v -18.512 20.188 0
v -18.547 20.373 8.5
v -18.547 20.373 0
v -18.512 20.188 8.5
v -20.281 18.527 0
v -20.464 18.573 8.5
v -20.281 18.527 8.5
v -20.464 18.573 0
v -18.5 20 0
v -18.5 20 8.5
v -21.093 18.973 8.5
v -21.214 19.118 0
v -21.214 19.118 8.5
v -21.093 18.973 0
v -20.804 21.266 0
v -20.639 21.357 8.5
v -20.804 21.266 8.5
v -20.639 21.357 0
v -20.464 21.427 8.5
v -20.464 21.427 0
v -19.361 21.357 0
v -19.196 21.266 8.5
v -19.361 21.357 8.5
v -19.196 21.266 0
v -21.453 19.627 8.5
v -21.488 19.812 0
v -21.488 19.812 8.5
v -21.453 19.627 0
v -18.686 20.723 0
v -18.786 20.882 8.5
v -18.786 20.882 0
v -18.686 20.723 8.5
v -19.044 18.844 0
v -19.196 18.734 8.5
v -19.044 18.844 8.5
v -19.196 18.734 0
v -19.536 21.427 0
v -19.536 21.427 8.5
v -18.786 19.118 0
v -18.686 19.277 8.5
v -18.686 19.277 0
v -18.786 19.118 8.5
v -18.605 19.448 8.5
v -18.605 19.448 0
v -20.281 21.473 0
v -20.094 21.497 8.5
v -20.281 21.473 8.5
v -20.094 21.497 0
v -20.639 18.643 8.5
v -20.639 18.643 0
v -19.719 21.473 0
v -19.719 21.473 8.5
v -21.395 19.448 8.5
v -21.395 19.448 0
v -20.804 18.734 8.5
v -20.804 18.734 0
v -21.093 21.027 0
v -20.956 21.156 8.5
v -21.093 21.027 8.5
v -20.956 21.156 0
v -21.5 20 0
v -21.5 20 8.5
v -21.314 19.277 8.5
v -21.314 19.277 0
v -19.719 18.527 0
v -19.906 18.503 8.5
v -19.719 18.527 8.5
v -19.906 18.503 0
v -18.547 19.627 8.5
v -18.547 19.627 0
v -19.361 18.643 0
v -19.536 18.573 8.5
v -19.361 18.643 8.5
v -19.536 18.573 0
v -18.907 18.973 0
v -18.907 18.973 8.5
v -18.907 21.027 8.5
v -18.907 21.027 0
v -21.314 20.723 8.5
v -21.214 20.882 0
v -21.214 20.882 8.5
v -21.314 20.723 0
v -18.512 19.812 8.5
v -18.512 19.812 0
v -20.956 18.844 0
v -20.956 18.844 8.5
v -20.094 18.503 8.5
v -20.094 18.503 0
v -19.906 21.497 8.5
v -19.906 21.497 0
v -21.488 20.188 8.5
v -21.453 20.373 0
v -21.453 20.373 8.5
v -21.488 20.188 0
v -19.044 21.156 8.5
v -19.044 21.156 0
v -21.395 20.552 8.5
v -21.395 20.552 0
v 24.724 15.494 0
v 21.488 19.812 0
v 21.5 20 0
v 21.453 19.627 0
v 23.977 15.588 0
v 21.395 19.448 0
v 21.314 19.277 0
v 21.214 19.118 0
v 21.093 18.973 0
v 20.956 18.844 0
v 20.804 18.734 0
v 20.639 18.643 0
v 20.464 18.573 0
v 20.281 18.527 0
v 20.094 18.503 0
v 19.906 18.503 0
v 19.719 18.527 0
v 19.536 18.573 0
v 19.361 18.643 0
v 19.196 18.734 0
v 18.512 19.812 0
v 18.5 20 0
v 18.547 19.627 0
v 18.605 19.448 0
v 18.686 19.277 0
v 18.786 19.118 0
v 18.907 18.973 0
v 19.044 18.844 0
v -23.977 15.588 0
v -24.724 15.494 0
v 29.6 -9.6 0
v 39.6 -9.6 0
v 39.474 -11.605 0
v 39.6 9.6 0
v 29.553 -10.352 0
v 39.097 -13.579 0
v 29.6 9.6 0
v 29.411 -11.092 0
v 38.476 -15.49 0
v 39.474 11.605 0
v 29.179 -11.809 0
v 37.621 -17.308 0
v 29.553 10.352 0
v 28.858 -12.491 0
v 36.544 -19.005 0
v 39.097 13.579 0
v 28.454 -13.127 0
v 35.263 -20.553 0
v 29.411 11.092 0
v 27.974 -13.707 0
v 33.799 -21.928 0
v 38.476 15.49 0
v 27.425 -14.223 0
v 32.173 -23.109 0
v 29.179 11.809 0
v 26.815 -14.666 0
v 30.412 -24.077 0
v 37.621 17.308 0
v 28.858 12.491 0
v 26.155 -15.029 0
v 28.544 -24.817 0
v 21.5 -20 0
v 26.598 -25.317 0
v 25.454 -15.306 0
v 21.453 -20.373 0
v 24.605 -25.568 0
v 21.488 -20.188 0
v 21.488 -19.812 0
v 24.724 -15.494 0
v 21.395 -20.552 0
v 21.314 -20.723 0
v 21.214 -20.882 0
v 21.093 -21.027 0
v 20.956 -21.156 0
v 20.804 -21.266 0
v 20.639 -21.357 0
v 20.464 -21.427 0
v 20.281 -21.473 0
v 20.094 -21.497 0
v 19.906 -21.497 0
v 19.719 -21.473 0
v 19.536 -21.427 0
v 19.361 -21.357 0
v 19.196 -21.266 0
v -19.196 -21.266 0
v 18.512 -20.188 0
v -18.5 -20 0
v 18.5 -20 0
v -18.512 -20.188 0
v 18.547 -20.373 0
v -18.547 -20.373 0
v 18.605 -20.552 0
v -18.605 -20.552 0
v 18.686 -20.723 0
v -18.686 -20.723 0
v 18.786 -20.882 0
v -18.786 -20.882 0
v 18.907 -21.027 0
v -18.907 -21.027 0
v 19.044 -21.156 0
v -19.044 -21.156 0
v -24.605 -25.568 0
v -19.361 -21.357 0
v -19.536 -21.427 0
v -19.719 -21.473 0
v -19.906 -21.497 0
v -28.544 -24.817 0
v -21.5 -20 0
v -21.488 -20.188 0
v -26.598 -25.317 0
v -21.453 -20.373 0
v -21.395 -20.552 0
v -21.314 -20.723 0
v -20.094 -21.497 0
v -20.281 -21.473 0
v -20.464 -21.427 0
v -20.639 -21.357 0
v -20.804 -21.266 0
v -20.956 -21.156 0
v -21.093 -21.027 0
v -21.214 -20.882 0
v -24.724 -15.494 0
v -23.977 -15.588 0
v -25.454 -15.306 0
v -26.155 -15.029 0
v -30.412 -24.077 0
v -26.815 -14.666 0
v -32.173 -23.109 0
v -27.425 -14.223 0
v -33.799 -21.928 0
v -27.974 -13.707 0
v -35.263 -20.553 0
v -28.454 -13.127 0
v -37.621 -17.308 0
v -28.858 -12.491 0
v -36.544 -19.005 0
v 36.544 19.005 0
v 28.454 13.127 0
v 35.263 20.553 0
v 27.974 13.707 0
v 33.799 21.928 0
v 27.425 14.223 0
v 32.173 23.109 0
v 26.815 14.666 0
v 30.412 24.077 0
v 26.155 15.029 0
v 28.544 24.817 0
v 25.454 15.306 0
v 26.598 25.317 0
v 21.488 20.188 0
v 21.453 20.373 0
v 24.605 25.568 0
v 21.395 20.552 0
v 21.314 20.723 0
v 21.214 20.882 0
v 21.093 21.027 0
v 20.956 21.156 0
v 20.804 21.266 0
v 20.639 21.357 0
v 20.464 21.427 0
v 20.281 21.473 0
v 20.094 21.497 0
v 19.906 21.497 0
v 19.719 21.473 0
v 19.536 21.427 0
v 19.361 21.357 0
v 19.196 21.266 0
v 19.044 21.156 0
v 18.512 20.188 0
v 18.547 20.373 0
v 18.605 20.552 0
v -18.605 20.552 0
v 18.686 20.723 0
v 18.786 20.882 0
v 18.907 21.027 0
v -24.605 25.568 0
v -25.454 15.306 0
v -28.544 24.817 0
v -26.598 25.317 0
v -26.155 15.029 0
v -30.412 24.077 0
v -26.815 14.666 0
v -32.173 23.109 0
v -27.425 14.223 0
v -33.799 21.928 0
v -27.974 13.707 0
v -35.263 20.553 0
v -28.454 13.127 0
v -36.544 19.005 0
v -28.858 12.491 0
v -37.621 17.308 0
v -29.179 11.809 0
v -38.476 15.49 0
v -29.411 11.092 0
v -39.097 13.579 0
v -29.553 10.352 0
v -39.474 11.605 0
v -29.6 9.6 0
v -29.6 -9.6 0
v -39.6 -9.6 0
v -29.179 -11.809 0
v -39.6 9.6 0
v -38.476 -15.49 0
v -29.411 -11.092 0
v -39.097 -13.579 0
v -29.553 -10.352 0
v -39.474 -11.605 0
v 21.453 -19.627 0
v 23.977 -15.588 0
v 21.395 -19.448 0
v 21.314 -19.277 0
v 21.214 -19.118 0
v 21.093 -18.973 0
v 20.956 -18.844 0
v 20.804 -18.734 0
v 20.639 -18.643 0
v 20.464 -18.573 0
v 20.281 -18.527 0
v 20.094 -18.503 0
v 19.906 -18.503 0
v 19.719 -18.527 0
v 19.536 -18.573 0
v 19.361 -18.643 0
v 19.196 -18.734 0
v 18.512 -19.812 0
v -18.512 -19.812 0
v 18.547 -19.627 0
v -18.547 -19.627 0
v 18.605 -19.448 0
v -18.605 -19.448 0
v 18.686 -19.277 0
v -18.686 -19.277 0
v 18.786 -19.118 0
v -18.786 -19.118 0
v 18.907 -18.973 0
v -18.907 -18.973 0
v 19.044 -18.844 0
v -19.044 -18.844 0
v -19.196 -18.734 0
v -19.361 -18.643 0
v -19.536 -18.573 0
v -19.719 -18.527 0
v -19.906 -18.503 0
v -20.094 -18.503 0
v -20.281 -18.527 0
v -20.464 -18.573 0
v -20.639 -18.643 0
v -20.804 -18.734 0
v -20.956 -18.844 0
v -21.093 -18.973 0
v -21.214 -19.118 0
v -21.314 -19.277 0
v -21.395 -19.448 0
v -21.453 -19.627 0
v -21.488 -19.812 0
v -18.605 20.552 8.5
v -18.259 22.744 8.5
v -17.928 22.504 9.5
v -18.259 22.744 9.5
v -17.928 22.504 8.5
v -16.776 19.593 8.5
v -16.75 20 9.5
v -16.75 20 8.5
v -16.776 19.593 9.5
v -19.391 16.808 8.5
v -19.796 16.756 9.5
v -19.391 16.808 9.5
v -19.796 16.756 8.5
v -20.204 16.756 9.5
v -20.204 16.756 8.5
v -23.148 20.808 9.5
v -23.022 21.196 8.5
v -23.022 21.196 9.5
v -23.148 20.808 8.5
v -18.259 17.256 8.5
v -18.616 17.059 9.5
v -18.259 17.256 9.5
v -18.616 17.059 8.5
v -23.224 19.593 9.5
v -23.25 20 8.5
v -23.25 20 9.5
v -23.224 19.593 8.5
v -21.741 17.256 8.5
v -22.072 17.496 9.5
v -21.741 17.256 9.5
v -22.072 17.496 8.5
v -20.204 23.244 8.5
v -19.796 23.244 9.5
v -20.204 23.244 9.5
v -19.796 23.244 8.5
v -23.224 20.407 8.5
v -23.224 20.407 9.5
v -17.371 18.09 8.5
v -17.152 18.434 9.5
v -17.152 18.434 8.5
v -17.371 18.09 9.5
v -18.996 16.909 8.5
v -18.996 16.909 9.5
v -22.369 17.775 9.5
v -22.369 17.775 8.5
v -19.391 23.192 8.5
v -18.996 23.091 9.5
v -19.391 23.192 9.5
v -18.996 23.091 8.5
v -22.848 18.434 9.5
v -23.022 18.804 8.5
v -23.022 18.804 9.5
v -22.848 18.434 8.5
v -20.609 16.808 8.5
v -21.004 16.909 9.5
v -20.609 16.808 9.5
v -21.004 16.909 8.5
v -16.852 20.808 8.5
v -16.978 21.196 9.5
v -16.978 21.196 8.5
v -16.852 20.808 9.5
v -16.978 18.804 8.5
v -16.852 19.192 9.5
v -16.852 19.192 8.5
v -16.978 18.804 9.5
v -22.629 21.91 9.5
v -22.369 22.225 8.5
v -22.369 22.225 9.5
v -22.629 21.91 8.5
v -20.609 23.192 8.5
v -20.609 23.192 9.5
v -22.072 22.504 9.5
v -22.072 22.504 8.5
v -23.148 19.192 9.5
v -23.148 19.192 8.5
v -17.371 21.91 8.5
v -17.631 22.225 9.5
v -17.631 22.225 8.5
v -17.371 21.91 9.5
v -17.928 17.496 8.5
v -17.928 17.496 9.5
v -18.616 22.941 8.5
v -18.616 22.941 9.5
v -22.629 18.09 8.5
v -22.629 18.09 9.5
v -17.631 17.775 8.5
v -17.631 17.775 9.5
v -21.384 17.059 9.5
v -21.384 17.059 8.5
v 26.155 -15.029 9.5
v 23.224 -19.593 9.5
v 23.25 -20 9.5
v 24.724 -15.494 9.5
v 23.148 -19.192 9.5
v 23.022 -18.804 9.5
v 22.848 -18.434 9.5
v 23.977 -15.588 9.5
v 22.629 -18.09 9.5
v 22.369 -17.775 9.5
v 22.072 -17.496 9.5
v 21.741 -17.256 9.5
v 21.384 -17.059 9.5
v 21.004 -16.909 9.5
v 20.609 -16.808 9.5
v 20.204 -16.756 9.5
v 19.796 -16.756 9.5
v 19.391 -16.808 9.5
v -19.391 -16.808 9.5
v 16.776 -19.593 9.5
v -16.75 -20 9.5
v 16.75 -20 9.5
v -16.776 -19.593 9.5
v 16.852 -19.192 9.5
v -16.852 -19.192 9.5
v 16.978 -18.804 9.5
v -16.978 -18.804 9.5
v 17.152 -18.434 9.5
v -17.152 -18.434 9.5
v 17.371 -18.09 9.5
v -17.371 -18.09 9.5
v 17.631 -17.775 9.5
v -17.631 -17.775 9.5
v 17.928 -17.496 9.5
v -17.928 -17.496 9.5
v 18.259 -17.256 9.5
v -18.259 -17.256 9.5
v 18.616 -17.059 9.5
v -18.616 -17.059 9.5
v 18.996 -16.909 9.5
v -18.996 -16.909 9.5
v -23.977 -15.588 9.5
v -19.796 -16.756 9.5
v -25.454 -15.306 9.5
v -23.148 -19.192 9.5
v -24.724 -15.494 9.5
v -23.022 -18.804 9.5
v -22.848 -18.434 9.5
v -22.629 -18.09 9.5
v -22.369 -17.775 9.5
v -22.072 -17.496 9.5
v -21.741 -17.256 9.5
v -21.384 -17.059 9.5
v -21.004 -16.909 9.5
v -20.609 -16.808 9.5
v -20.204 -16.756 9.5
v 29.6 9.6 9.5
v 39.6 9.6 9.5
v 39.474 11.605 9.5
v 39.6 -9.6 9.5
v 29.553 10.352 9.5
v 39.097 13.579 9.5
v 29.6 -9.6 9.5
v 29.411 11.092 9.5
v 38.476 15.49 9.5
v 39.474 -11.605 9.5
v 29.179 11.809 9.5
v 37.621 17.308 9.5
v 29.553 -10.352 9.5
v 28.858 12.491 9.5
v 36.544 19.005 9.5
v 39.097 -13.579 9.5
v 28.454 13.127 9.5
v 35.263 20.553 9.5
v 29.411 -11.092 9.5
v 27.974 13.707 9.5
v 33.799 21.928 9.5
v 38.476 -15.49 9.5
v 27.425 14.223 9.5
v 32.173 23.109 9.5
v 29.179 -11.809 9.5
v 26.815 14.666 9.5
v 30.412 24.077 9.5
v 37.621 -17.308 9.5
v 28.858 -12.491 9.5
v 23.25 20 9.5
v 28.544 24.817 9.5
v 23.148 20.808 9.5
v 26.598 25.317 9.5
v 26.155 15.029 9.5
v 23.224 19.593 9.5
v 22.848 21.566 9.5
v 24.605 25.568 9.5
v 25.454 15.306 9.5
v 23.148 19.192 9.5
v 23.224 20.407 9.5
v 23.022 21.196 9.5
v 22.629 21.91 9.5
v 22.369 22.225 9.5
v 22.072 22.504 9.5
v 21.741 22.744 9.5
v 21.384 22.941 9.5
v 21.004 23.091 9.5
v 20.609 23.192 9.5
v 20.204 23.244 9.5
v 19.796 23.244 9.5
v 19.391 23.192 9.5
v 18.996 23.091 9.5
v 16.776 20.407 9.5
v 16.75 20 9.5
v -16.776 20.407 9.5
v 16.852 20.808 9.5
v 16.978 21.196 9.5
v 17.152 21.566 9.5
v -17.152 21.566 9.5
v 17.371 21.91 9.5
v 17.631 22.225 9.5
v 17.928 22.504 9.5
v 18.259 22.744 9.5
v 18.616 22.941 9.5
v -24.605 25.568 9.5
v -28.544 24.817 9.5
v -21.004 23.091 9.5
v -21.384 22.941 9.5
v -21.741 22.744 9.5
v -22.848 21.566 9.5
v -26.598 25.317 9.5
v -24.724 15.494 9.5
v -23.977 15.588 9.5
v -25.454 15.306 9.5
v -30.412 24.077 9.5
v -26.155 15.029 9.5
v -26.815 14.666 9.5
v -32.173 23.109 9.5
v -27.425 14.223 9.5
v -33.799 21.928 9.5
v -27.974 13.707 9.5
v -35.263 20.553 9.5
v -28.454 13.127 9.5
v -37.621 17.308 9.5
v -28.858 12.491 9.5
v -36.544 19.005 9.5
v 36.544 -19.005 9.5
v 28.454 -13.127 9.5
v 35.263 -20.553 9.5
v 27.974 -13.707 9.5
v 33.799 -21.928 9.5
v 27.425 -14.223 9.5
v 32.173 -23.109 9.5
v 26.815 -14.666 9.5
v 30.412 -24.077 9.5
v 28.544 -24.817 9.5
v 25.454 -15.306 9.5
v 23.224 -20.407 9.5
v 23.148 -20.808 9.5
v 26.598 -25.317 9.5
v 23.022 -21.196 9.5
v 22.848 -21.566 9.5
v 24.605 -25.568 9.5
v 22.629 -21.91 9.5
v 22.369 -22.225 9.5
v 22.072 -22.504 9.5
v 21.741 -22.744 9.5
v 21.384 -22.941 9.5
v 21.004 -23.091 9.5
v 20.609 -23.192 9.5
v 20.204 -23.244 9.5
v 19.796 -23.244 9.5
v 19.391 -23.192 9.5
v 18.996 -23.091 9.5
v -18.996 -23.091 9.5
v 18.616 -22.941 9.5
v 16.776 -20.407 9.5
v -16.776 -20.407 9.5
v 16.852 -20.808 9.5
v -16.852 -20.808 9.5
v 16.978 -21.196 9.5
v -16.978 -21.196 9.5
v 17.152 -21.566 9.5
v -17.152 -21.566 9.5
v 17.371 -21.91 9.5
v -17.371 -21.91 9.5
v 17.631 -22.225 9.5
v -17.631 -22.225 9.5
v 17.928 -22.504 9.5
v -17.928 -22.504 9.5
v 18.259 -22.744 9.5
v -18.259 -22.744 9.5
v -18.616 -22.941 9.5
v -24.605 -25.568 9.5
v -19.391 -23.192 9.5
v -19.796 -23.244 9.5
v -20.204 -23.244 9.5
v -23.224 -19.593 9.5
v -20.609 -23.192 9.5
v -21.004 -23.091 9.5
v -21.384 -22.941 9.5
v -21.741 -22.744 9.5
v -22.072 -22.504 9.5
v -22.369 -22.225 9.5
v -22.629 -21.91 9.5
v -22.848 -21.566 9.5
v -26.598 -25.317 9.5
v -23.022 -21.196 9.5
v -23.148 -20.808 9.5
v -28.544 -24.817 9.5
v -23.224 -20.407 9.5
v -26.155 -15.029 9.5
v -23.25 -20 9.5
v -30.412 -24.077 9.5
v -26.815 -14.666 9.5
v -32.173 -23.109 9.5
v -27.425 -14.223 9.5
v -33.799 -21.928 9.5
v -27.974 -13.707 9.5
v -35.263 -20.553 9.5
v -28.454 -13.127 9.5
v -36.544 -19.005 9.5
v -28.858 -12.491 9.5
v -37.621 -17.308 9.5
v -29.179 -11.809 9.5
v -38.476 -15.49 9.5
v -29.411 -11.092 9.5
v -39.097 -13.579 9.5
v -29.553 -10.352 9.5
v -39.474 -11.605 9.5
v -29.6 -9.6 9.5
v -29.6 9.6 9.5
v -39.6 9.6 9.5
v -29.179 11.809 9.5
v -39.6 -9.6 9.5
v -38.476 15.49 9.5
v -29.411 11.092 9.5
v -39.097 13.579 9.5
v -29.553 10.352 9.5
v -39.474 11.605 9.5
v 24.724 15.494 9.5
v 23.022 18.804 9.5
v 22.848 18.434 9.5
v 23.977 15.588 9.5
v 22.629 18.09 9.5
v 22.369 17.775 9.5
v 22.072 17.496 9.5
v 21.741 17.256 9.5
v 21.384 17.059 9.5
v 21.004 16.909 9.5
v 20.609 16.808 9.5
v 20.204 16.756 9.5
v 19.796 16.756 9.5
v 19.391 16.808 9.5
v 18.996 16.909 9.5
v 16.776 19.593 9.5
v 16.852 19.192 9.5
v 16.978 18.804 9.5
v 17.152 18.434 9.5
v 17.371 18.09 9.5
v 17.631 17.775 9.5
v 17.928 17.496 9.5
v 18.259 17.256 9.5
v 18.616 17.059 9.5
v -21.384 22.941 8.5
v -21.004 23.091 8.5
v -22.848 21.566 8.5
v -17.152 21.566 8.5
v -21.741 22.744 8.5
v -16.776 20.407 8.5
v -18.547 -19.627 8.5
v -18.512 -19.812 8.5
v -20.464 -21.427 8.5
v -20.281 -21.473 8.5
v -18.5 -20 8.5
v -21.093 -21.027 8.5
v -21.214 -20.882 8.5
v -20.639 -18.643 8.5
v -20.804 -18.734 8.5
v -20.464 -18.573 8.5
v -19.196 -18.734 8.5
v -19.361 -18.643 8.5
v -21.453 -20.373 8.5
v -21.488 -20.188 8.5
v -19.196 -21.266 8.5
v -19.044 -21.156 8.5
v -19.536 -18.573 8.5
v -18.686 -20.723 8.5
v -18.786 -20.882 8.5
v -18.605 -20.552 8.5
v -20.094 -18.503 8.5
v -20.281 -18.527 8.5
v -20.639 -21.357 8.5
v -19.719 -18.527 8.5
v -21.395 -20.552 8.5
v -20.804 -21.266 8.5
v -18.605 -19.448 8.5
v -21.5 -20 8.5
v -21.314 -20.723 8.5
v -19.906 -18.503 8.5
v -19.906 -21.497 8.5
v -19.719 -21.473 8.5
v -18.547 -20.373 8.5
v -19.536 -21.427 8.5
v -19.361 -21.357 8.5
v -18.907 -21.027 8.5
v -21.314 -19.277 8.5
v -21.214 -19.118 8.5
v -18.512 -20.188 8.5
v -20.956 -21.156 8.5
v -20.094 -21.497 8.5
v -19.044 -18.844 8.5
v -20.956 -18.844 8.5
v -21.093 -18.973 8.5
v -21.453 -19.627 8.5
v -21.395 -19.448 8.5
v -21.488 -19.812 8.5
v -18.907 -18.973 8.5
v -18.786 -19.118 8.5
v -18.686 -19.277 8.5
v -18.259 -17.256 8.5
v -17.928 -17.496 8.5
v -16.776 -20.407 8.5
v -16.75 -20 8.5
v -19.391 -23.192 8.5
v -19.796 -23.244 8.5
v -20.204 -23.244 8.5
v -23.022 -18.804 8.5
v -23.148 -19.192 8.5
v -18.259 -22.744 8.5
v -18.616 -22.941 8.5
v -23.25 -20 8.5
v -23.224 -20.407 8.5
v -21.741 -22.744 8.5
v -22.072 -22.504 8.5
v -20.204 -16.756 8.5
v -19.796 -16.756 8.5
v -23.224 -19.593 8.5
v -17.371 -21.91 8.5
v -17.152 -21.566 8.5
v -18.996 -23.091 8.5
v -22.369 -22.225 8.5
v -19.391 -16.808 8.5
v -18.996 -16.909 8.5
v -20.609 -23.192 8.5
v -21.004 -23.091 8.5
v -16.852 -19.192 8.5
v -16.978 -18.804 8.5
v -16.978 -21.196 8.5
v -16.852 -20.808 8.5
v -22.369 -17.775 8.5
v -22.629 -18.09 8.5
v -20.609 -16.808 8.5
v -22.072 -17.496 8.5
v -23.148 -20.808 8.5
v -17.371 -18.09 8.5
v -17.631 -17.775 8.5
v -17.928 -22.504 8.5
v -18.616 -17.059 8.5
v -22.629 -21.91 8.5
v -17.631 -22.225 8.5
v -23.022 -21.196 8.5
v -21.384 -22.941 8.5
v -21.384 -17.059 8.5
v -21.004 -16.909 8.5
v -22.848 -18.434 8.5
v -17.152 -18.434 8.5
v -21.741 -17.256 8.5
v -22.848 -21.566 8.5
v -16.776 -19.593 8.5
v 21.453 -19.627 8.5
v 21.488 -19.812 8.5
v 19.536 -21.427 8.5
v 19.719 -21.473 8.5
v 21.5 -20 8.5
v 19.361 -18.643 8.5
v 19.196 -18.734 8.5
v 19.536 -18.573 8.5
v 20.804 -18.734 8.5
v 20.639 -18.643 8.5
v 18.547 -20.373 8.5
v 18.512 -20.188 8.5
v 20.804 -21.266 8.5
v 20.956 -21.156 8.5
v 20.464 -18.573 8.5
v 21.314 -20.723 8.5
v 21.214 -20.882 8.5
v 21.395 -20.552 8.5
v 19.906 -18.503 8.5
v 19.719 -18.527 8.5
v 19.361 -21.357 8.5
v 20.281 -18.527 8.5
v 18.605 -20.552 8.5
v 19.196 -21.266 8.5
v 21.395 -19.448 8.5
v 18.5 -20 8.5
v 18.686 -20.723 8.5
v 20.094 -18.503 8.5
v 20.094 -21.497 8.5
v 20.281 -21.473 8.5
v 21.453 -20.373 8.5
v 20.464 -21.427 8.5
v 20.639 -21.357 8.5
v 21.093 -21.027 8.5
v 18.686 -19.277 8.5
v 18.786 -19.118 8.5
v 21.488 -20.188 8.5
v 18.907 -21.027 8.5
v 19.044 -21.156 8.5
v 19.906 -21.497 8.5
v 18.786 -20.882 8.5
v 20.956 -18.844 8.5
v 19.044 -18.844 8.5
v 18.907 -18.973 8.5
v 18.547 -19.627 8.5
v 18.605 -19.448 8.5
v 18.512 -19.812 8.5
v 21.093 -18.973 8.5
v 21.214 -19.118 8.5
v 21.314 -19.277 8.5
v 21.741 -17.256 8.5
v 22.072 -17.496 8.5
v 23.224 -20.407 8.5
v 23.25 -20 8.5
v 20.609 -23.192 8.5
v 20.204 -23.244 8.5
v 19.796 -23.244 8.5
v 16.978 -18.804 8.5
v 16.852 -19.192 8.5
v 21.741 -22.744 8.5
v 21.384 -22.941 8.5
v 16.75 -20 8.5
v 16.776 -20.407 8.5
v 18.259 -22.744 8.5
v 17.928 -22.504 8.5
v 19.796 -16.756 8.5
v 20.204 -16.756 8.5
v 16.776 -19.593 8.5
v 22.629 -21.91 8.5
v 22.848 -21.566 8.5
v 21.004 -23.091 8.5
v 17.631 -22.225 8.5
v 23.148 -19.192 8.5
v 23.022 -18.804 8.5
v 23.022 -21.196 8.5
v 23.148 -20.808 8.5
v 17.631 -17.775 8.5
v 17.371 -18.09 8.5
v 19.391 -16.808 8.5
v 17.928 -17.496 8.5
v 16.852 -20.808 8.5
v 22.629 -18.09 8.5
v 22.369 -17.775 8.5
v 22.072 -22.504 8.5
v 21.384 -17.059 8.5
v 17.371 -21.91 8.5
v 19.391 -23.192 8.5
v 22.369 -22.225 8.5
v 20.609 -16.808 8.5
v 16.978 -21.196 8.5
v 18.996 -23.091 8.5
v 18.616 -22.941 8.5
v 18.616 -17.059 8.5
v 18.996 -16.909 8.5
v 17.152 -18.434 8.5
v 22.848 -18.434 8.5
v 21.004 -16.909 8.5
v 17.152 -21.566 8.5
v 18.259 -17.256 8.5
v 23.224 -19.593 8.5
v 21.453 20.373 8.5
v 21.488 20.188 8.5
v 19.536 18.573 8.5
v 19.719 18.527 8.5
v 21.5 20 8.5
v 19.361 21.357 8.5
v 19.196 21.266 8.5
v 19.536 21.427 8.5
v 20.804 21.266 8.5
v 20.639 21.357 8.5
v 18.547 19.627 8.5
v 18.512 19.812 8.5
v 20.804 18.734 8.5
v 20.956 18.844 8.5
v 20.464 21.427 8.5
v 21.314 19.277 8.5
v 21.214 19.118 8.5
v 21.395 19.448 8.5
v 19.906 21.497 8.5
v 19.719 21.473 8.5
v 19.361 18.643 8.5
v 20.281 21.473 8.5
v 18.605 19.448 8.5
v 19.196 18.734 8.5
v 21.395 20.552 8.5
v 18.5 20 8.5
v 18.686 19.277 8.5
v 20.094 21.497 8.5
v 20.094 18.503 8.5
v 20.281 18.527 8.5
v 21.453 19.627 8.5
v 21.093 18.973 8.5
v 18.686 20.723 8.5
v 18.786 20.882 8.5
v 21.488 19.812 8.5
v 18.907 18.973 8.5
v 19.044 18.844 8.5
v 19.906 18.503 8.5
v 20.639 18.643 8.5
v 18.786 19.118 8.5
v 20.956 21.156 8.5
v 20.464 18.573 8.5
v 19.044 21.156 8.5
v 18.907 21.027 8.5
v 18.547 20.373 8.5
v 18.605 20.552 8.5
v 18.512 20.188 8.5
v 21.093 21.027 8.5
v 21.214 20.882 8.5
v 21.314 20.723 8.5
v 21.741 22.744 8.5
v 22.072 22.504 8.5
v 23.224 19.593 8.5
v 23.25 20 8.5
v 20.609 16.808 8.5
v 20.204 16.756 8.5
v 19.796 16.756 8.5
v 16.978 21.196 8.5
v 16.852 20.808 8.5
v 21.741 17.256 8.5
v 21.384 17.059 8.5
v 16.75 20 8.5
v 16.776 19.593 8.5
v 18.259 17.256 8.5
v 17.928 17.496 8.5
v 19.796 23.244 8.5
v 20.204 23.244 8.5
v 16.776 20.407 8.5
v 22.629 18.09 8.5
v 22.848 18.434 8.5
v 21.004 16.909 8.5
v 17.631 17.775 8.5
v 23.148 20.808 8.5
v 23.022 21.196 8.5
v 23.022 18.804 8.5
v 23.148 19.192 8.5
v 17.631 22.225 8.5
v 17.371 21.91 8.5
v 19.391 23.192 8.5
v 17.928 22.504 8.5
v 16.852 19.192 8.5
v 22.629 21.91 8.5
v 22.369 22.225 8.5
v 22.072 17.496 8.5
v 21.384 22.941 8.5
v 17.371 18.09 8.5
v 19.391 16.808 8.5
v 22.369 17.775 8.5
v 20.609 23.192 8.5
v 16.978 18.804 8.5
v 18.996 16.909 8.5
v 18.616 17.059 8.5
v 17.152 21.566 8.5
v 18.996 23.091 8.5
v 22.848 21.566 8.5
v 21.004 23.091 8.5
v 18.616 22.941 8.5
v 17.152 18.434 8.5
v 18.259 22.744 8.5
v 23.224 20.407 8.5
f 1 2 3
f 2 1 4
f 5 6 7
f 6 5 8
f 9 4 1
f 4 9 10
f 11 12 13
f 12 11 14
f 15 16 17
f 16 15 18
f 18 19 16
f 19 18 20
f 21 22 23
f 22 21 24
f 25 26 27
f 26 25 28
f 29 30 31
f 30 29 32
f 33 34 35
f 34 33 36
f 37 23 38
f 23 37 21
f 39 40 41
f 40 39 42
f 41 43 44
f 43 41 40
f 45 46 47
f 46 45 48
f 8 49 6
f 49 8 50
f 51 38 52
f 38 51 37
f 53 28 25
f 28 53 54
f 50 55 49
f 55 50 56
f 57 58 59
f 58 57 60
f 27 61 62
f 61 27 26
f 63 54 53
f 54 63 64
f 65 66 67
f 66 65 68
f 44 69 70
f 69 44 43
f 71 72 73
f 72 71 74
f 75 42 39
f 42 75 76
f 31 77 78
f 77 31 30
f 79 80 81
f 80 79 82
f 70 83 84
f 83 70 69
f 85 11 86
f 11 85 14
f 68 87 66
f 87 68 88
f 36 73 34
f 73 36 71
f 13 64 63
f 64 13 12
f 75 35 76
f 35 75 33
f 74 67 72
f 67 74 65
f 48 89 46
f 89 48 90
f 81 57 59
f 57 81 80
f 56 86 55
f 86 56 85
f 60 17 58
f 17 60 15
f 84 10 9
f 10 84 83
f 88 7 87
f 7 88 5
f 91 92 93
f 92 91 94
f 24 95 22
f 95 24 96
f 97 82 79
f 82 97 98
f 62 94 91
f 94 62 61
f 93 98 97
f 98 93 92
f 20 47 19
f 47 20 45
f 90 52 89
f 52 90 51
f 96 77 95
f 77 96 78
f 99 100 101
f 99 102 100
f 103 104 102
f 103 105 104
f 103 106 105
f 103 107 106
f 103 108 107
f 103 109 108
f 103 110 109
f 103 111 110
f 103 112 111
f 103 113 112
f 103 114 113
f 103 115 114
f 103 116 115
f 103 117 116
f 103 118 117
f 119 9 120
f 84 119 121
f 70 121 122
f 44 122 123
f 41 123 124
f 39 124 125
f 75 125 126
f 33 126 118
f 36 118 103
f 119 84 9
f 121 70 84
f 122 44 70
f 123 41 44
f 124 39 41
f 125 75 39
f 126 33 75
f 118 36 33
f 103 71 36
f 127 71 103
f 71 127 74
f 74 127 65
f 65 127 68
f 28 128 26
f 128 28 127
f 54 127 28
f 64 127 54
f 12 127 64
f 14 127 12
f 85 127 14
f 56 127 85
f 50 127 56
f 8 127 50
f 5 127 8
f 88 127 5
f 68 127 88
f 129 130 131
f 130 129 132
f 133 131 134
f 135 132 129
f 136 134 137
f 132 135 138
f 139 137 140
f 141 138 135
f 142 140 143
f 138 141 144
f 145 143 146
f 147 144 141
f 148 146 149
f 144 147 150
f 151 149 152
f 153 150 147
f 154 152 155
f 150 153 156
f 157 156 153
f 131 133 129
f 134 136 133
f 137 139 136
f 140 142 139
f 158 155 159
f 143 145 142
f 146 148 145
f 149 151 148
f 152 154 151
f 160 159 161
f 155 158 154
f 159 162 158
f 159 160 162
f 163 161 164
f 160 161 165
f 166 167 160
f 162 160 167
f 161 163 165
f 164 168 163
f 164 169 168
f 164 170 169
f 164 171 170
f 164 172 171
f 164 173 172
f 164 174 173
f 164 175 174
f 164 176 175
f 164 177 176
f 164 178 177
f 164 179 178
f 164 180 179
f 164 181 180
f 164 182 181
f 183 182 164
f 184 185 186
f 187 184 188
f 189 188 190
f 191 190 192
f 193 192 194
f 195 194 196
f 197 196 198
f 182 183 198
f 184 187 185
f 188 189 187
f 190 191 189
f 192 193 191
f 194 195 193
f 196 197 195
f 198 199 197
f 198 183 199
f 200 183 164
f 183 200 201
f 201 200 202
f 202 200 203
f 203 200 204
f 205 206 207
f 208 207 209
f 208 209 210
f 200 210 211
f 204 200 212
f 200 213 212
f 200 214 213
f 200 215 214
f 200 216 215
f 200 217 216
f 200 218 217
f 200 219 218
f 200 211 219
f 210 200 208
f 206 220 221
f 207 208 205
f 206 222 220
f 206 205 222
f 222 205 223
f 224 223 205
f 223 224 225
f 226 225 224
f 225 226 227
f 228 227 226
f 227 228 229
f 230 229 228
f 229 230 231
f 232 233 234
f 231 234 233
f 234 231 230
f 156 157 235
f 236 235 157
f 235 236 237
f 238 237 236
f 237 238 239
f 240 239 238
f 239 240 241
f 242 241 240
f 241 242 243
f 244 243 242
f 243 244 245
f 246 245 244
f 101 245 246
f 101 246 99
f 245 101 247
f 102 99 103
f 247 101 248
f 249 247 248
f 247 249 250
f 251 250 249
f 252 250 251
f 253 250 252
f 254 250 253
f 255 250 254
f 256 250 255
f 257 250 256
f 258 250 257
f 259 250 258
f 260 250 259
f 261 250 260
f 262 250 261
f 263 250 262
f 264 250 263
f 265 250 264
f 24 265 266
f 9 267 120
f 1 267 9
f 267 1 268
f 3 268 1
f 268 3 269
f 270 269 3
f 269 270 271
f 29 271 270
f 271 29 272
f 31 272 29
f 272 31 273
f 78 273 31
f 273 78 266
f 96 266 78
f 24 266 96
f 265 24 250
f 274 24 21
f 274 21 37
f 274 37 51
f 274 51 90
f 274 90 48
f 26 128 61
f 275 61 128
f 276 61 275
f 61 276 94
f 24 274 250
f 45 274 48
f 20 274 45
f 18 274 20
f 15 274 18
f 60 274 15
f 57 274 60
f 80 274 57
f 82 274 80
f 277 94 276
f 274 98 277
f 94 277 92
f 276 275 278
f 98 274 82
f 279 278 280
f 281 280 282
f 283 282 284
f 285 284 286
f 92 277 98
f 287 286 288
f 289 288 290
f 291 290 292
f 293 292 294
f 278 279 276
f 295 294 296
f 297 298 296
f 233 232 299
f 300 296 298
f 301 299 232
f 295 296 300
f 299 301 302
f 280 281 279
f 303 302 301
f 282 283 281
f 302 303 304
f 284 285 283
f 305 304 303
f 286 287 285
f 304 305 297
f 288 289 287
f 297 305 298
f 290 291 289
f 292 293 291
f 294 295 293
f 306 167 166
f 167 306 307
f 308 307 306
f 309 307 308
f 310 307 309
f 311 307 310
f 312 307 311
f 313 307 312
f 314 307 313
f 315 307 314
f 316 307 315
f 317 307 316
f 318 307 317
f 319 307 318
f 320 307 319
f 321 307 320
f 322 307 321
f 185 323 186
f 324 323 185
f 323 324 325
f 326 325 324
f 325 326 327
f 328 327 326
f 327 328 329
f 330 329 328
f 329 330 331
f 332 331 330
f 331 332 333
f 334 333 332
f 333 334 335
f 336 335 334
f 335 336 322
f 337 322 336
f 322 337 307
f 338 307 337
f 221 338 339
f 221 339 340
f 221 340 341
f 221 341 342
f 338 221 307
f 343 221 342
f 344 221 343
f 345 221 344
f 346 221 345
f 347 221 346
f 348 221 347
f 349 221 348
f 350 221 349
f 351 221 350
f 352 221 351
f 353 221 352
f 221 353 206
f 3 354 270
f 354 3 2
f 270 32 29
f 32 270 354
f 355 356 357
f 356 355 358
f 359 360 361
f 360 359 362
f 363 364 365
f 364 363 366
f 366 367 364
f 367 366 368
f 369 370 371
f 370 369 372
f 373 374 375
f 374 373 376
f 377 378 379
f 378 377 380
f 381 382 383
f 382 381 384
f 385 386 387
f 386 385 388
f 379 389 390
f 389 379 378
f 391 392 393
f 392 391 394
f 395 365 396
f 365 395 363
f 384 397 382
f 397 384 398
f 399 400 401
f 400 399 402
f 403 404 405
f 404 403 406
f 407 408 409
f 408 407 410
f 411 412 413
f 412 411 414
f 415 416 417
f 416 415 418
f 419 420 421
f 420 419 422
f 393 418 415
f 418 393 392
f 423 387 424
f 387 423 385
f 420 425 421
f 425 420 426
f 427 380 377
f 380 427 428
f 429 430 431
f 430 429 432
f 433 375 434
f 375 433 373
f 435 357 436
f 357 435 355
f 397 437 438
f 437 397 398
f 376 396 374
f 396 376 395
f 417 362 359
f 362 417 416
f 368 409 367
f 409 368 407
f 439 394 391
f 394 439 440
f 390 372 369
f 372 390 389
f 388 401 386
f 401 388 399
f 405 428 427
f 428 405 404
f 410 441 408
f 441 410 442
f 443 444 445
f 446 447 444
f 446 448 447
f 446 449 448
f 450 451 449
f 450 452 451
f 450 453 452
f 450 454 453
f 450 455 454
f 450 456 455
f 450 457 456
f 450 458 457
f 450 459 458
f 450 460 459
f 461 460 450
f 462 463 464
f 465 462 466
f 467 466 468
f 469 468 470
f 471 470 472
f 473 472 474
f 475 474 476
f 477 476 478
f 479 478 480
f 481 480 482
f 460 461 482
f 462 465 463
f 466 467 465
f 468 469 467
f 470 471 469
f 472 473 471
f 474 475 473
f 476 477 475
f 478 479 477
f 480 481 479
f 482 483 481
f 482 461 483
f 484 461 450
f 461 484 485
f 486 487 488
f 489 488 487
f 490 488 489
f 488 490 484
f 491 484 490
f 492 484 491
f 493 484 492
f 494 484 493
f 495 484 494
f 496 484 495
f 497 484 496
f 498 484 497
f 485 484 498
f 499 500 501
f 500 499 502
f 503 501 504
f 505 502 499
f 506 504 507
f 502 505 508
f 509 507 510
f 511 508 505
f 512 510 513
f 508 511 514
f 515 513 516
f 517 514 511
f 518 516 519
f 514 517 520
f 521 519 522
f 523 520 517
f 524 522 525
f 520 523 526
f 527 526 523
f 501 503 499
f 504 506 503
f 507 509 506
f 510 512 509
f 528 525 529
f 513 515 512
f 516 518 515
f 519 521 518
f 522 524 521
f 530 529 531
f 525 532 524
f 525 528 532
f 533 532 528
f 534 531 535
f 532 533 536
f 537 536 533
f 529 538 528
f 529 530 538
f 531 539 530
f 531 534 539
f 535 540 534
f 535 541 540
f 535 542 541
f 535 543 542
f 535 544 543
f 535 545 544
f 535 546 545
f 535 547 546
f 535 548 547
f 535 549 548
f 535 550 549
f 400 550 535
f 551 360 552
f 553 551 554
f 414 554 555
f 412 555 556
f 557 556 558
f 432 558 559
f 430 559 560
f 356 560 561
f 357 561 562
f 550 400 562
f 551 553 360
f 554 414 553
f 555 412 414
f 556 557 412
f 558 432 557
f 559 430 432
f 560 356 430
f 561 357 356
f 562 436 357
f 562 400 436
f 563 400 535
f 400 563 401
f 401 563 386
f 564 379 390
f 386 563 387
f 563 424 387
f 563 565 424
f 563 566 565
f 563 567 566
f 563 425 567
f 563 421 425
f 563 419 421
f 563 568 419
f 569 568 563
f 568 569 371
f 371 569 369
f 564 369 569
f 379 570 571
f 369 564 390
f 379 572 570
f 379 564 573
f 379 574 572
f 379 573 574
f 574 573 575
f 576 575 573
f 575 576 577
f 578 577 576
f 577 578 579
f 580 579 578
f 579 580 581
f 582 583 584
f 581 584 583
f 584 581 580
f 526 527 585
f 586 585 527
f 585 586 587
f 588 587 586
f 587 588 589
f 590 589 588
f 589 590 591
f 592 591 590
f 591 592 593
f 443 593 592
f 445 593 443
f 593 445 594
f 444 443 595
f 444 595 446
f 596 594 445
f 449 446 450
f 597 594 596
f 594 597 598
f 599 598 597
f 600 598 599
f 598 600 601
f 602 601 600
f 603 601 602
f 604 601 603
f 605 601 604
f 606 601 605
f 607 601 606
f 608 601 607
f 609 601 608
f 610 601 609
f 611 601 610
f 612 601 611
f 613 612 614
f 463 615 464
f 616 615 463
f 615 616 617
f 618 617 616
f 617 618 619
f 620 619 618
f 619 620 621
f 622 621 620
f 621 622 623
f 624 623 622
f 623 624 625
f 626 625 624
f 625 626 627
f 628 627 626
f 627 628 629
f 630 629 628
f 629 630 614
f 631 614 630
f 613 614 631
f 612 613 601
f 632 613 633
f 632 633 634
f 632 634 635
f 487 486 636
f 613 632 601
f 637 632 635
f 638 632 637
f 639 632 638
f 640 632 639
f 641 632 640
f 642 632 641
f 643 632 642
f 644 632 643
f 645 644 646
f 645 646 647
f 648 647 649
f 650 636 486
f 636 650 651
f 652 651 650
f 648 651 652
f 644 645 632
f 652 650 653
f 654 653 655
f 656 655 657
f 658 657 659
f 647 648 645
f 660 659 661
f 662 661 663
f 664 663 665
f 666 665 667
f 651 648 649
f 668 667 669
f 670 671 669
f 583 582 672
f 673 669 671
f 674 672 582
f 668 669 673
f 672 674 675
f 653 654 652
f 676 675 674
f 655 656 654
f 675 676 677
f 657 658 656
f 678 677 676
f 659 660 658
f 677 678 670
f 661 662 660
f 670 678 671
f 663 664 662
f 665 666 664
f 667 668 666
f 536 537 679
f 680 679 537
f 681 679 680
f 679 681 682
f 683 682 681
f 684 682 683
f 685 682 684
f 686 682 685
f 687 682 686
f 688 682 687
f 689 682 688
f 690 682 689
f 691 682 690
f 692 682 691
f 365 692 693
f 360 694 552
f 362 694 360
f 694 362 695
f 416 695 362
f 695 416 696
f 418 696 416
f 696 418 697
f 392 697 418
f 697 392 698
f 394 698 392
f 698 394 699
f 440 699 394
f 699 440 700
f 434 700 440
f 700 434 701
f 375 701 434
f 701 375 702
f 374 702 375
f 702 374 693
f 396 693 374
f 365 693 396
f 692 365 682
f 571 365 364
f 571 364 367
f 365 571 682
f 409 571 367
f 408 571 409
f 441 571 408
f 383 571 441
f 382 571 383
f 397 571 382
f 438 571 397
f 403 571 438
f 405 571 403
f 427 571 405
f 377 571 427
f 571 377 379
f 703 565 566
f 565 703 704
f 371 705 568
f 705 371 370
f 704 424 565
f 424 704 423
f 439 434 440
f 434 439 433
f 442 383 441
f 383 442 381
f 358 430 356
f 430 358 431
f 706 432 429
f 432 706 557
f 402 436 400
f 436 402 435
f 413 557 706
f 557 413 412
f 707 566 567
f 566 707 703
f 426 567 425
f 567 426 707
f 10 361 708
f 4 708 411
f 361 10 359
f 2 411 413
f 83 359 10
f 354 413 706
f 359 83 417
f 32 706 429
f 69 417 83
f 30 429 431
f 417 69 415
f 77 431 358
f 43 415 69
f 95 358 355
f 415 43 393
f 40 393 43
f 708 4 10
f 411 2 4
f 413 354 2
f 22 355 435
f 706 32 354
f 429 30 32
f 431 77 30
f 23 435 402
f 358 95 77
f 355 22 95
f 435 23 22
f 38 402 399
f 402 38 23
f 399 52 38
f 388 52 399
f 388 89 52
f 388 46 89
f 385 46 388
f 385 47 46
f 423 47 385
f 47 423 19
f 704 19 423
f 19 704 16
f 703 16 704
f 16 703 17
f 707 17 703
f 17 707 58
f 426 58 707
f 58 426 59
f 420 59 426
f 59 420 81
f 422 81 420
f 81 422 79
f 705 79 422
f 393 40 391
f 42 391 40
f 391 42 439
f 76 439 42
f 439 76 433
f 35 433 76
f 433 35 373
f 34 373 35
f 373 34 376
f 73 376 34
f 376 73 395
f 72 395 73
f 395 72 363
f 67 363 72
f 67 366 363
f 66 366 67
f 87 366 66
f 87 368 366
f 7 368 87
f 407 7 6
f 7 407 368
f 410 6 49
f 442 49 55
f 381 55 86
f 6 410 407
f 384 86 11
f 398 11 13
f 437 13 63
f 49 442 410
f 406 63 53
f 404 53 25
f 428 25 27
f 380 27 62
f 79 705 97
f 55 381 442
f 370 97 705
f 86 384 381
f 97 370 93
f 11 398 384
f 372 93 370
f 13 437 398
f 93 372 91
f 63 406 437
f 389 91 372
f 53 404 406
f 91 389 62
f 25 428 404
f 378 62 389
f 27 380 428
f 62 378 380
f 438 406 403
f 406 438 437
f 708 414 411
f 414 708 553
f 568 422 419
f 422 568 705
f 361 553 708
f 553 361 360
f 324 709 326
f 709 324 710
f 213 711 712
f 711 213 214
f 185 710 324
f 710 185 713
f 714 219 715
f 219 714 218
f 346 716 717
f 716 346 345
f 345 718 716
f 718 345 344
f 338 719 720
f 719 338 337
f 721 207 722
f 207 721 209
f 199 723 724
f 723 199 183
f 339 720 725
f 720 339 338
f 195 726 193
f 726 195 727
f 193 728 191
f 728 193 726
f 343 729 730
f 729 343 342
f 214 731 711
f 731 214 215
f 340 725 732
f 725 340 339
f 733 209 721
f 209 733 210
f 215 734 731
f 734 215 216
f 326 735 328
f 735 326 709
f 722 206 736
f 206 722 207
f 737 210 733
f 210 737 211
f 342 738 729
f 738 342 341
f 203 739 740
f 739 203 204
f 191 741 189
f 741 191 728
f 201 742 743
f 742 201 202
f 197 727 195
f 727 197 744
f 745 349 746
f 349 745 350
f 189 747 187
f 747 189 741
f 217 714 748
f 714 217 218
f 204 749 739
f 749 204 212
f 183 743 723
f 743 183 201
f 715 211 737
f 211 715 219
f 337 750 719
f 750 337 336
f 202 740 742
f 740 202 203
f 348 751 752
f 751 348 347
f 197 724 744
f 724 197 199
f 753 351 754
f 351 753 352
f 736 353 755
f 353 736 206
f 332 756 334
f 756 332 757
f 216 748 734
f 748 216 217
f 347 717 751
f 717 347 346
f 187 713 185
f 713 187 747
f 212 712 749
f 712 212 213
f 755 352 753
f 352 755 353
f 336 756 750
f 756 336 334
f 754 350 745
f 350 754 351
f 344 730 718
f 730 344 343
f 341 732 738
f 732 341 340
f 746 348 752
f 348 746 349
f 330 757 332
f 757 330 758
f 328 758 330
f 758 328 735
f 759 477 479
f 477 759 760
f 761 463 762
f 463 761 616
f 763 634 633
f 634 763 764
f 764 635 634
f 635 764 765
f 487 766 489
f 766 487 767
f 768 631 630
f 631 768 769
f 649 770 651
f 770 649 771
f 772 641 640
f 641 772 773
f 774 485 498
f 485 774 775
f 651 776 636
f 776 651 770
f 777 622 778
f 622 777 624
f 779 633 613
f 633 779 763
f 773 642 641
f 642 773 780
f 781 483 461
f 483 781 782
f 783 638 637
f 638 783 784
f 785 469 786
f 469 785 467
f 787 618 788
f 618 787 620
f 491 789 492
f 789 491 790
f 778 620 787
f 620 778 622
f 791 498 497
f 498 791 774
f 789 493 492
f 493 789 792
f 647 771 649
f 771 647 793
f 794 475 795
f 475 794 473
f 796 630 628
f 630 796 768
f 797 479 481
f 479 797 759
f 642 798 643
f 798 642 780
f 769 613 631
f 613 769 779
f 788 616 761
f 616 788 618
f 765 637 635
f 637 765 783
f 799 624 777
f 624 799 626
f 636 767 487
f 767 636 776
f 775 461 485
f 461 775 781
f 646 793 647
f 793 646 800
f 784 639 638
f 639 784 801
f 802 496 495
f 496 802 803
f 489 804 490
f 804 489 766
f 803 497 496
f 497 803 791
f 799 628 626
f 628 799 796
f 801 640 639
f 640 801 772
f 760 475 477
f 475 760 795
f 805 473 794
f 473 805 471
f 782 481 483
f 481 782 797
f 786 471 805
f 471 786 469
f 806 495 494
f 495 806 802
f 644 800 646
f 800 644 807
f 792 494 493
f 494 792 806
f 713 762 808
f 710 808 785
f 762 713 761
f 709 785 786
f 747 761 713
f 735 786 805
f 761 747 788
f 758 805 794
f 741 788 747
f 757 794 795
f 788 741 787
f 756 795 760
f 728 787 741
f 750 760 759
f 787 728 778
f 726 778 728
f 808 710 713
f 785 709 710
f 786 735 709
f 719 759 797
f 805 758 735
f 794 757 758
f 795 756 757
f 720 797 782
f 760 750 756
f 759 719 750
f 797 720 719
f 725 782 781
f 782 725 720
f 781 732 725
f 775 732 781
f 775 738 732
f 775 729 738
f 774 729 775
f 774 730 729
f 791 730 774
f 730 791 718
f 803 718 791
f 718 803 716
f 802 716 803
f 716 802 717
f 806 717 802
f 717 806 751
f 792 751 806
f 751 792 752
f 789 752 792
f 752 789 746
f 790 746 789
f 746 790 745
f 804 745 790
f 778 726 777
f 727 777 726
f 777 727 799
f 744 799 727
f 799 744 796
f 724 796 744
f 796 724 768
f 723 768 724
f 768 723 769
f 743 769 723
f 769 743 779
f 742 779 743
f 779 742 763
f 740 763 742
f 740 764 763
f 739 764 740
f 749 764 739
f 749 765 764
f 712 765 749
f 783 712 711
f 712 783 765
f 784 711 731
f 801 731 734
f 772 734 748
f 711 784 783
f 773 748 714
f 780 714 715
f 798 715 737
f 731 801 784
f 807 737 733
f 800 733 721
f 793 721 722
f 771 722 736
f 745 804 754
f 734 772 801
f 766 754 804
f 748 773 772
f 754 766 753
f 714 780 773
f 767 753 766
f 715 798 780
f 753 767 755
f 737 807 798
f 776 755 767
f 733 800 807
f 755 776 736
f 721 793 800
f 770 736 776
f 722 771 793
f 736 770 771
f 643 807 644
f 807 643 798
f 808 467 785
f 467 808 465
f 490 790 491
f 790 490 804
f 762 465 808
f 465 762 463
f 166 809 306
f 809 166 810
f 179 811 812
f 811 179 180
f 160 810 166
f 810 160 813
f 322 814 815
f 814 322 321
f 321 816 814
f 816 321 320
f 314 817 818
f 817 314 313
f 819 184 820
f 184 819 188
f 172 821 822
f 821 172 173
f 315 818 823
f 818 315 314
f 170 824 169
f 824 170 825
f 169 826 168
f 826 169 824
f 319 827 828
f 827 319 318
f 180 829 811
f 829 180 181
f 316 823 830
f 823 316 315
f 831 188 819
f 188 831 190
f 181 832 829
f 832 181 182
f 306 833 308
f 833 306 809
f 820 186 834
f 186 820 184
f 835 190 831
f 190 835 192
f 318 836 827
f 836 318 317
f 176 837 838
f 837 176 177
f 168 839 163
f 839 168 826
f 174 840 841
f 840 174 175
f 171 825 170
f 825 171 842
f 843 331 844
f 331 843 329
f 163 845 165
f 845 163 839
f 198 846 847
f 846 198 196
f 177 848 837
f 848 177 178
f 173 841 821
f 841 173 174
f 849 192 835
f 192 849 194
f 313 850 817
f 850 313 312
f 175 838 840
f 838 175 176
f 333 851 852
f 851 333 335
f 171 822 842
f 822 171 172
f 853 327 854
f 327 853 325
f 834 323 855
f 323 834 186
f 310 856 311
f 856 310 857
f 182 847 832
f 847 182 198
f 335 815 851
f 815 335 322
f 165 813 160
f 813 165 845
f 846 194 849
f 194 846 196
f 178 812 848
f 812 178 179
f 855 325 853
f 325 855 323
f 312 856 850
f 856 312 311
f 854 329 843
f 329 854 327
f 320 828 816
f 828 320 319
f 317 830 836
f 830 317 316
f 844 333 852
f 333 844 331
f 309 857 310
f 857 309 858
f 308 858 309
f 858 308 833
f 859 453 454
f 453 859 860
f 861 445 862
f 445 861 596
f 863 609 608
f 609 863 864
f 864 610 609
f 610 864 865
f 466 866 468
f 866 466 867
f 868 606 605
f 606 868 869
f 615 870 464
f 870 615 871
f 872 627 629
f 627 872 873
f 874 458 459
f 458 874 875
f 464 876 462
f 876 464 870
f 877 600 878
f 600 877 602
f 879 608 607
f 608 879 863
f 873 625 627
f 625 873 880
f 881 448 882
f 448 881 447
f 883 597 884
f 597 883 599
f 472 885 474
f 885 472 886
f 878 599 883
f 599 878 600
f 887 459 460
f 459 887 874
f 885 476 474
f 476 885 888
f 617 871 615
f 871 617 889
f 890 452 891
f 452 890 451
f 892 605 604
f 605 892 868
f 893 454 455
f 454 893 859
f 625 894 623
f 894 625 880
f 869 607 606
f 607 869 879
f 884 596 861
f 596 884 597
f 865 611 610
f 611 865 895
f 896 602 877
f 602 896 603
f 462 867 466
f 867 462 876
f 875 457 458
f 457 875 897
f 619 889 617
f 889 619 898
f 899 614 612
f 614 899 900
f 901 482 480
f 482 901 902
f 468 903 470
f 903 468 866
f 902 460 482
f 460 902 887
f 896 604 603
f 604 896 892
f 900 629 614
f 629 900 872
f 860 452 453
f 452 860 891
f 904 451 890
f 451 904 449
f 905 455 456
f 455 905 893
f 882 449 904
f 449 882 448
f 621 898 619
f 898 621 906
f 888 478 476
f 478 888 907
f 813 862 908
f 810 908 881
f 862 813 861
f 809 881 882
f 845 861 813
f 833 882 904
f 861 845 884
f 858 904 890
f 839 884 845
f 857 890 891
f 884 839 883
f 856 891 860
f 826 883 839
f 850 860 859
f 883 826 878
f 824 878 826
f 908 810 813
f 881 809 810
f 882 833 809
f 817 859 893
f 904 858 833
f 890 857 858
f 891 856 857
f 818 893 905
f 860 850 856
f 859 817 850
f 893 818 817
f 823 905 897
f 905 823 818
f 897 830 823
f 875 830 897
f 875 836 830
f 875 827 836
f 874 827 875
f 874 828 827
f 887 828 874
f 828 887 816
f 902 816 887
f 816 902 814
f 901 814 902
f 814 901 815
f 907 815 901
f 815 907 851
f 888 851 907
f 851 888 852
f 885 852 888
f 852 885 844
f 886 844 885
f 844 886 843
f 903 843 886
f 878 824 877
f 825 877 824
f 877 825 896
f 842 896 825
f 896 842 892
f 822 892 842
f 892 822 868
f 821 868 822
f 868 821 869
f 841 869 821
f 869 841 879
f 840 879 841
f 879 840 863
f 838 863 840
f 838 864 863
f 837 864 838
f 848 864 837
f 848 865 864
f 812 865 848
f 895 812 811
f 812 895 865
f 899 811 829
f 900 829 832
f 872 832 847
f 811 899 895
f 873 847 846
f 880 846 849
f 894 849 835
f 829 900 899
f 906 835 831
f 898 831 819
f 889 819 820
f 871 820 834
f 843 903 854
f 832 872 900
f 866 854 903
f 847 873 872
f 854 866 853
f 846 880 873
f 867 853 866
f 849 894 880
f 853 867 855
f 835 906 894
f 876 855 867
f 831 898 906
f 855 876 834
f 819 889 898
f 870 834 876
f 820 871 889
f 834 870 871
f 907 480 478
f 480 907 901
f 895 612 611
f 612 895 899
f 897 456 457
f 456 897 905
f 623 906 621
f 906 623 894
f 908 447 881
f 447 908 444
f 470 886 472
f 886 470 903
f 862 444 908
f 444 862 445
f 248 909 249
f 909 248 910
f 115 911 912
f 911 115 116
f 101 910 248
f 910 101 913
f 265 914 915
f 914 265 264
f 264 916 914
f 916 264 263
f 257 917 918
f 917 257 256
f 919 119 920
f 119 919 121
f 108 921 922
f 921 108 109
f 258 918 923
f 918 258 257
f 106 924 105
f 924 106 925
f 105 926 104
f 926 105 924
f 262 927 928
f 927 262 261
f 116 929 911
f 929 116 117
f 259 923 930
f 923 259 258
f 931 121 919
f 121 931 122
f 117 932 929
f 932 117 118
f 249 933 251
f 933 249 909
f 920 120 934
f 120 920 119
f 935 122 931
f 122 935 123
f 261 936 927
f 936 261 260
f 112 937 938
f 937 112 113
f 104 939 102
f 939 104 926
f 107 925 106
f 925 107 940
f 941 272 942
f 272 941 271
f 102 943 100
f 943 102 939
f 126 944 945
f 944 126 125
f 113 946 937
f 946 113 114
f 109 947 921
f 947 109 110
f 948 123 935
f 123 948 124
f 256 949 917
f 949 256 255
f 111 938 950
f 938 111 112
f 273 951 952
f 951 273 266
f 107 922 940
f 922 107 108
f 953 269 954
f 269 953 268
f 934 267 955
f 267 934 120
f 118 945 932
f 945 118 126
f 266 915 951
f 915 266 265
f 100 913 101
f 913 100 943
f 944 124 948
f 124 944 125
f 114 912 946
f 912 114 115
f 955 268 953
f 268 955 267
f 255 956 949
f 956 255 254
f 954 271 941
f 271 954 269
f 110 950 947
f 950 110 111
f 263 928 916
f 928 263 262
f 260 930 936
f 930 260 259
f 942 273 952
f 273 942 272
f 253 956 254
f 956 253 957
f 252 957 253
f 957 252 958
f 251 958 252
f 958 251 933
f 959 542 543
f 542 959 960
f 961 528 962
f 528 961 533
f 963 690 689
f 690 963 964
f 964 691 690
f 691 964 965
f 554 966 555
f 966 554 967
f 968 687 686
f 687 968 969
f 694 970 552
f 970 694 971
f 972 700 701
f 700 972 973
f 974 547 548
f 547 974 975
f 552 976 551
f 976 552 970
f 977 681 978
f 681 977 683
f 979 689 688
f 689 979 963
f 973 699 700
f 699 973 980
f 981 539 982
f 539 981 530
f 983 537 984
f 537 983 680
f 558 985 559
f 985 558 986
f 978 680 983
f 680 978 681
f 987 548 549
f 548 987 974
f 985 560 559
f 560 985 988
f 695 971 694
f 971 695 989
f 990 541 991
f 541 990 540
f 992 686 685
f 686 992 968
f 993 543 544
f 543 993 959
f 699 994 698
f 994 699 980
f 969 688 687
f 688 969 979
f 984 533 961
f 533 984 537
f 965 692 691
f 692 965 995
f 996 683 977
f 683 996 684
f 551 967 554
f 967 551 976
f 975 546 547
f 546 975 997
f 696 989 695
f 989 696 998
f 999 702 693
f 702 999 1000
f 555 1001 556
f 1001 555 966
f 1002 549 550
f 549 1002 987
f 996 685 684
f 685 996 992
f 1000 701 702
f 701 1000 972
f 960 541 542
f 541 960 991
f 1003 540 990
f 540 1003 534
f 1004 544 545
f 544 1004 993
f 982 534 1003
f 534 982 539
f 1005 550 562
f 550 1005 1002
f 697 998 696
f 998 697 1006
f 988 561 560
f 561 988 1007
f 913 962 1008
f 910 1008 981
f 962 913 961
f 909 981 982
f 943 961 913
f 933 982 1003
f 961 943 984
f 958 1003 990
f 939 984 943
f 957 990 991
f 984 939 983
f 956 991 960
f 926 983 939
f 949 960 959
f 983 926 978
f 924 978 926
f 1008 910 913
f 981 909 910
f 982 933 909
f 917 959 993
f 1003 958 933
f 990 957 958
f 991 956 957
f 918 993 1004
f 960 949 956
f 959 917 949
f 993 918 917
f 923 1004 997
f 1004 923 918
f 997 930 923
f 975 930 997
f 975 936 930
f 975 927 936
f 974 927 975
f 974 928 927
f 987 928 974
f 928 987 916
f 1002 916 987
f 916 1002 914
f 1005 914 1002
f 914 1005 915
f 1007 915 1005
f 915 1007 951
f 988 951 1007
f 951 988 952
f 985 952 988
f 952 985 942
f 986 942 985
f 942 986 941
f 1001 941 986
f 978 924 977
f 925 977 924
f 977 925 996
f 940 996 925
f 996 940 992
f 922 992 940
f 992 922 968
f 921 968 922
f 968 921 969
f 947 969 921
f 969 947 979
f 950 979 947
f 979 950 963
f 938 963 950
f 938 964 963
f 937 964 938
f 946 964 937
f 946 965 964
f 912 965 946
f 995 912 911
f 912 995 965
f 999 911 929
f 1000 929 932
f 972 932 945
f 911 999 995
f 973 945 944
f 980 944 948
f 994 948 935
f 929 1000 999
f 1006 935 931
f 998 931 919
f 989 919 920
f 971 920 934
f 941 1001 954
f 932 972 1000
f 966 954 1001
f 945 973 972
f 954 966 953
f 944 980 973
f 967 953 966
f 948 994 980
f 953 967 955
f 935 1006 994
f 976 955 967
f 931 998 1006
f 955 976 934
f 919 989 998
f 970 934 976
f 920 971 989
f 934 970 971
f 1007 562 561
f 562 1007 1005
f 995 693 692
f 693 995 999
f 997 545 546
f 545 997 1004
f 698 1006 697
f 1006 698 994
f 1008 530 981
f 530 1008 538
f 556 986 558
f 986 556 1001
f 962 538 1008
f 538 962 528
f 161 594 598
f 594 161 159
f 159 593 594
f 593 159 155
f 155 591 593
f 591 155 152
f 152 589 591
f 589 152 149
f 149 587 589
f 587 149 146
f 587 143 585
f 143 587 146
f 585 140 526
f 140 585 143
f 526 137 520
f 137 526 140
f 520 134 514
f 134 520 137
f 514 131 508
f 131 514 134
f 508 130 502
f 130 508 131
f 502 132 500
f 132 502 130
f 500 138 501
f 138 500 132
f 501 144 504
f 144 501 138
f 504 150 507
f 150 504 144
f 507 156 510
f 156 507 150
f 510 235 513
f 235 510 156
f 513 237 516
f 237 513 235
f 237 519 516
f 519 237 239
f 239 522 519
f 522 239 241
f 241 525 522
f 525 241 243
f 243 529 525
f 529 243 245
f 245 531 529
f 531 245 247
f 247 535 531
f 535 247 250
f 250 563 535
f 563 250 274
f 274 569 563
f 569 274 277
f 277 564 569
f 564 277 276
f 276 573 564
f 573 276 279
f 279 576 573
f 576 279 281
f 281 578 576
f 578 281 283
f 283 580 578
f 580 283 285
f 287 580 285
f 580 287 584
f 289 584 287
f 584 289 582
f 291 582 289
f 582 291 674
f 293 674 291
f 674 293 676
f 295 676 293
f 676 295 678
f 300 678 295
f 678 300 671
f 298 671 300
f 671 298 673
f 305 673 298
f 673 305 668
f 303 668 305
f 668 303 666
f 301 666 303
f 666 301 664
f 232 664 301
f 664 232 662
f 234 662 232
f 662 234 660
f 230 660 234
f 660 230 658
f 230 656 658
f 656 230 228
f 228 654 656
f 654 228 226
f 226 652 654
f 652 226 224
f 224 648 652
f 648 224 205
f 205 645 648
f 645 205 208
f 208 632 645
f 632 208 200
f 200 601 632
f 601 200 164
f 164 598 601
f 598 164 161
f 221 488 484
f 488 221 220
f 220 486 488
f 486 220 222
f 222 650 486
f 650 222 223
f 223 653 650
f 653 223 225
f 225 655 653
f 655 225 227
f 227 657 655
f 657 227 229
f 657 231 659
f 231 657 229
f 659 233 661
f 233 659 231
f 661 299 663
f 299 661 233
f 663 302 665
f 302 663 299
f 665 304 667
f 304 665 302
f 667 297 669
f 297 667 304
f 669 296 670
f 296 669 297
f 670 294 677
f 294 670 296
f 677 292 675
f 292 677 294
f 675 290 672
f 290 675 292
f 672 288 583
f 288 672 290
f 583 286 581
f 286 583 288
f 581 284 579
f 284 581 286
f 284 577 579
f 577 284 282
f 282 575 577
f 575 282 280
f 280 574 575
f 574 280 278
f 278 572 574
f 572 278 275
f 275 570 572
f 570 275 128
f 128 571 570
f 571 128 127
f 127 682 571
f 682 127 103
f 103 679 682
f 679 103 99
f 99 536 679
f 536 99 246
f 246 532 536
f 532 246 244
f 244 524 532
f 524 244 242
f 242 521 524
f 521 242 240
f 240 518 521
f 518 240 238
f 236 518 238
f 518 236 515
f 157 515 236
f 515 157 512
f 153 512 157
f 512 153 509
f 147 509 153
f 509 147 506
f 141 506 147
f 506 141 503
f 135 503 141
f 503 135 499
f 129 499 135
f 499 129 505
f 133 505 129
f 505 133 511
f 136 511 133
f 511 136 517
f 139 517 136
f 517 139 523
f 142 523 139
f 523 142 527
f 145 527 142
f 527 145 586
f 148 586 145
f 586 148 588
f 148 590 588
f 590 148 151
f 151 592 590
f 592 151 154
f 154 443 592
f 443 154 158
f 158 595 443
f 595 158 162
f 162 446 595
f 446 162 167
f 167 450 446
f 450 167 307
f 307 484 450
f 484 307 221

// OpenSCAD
$fn = 50;

circle_d = 12;
dist = (22 - 6.6);
size = [43.8 + dist - circle_d, 15.8 + dist - circle_d];
height=9.5;

nut_d = 6.5;
screw_d = 3;
nut_height = 1;

difference() {
    linear_extrude(height=height)
    difference() {
        body(size, circle_d+20);
        body(size, circle_d);
    };
    for(i=[[-1,1], [-1, -1], [1, -1], [1, 1]]) {
        translate([i.x * 20, i.y * 20]) {
            linear_extrude(10)
            circle(d=screw_d);
            
            translate([0, 0, height-nut_height])
            linear_extrude(nut_height)
            circle(d=nut_d);
        }
    }
}


module body(size, circle_d) {
    minkowski() {
        circle(d=circle_d);
        square([size.x, size.y], center=true);
    }
}
